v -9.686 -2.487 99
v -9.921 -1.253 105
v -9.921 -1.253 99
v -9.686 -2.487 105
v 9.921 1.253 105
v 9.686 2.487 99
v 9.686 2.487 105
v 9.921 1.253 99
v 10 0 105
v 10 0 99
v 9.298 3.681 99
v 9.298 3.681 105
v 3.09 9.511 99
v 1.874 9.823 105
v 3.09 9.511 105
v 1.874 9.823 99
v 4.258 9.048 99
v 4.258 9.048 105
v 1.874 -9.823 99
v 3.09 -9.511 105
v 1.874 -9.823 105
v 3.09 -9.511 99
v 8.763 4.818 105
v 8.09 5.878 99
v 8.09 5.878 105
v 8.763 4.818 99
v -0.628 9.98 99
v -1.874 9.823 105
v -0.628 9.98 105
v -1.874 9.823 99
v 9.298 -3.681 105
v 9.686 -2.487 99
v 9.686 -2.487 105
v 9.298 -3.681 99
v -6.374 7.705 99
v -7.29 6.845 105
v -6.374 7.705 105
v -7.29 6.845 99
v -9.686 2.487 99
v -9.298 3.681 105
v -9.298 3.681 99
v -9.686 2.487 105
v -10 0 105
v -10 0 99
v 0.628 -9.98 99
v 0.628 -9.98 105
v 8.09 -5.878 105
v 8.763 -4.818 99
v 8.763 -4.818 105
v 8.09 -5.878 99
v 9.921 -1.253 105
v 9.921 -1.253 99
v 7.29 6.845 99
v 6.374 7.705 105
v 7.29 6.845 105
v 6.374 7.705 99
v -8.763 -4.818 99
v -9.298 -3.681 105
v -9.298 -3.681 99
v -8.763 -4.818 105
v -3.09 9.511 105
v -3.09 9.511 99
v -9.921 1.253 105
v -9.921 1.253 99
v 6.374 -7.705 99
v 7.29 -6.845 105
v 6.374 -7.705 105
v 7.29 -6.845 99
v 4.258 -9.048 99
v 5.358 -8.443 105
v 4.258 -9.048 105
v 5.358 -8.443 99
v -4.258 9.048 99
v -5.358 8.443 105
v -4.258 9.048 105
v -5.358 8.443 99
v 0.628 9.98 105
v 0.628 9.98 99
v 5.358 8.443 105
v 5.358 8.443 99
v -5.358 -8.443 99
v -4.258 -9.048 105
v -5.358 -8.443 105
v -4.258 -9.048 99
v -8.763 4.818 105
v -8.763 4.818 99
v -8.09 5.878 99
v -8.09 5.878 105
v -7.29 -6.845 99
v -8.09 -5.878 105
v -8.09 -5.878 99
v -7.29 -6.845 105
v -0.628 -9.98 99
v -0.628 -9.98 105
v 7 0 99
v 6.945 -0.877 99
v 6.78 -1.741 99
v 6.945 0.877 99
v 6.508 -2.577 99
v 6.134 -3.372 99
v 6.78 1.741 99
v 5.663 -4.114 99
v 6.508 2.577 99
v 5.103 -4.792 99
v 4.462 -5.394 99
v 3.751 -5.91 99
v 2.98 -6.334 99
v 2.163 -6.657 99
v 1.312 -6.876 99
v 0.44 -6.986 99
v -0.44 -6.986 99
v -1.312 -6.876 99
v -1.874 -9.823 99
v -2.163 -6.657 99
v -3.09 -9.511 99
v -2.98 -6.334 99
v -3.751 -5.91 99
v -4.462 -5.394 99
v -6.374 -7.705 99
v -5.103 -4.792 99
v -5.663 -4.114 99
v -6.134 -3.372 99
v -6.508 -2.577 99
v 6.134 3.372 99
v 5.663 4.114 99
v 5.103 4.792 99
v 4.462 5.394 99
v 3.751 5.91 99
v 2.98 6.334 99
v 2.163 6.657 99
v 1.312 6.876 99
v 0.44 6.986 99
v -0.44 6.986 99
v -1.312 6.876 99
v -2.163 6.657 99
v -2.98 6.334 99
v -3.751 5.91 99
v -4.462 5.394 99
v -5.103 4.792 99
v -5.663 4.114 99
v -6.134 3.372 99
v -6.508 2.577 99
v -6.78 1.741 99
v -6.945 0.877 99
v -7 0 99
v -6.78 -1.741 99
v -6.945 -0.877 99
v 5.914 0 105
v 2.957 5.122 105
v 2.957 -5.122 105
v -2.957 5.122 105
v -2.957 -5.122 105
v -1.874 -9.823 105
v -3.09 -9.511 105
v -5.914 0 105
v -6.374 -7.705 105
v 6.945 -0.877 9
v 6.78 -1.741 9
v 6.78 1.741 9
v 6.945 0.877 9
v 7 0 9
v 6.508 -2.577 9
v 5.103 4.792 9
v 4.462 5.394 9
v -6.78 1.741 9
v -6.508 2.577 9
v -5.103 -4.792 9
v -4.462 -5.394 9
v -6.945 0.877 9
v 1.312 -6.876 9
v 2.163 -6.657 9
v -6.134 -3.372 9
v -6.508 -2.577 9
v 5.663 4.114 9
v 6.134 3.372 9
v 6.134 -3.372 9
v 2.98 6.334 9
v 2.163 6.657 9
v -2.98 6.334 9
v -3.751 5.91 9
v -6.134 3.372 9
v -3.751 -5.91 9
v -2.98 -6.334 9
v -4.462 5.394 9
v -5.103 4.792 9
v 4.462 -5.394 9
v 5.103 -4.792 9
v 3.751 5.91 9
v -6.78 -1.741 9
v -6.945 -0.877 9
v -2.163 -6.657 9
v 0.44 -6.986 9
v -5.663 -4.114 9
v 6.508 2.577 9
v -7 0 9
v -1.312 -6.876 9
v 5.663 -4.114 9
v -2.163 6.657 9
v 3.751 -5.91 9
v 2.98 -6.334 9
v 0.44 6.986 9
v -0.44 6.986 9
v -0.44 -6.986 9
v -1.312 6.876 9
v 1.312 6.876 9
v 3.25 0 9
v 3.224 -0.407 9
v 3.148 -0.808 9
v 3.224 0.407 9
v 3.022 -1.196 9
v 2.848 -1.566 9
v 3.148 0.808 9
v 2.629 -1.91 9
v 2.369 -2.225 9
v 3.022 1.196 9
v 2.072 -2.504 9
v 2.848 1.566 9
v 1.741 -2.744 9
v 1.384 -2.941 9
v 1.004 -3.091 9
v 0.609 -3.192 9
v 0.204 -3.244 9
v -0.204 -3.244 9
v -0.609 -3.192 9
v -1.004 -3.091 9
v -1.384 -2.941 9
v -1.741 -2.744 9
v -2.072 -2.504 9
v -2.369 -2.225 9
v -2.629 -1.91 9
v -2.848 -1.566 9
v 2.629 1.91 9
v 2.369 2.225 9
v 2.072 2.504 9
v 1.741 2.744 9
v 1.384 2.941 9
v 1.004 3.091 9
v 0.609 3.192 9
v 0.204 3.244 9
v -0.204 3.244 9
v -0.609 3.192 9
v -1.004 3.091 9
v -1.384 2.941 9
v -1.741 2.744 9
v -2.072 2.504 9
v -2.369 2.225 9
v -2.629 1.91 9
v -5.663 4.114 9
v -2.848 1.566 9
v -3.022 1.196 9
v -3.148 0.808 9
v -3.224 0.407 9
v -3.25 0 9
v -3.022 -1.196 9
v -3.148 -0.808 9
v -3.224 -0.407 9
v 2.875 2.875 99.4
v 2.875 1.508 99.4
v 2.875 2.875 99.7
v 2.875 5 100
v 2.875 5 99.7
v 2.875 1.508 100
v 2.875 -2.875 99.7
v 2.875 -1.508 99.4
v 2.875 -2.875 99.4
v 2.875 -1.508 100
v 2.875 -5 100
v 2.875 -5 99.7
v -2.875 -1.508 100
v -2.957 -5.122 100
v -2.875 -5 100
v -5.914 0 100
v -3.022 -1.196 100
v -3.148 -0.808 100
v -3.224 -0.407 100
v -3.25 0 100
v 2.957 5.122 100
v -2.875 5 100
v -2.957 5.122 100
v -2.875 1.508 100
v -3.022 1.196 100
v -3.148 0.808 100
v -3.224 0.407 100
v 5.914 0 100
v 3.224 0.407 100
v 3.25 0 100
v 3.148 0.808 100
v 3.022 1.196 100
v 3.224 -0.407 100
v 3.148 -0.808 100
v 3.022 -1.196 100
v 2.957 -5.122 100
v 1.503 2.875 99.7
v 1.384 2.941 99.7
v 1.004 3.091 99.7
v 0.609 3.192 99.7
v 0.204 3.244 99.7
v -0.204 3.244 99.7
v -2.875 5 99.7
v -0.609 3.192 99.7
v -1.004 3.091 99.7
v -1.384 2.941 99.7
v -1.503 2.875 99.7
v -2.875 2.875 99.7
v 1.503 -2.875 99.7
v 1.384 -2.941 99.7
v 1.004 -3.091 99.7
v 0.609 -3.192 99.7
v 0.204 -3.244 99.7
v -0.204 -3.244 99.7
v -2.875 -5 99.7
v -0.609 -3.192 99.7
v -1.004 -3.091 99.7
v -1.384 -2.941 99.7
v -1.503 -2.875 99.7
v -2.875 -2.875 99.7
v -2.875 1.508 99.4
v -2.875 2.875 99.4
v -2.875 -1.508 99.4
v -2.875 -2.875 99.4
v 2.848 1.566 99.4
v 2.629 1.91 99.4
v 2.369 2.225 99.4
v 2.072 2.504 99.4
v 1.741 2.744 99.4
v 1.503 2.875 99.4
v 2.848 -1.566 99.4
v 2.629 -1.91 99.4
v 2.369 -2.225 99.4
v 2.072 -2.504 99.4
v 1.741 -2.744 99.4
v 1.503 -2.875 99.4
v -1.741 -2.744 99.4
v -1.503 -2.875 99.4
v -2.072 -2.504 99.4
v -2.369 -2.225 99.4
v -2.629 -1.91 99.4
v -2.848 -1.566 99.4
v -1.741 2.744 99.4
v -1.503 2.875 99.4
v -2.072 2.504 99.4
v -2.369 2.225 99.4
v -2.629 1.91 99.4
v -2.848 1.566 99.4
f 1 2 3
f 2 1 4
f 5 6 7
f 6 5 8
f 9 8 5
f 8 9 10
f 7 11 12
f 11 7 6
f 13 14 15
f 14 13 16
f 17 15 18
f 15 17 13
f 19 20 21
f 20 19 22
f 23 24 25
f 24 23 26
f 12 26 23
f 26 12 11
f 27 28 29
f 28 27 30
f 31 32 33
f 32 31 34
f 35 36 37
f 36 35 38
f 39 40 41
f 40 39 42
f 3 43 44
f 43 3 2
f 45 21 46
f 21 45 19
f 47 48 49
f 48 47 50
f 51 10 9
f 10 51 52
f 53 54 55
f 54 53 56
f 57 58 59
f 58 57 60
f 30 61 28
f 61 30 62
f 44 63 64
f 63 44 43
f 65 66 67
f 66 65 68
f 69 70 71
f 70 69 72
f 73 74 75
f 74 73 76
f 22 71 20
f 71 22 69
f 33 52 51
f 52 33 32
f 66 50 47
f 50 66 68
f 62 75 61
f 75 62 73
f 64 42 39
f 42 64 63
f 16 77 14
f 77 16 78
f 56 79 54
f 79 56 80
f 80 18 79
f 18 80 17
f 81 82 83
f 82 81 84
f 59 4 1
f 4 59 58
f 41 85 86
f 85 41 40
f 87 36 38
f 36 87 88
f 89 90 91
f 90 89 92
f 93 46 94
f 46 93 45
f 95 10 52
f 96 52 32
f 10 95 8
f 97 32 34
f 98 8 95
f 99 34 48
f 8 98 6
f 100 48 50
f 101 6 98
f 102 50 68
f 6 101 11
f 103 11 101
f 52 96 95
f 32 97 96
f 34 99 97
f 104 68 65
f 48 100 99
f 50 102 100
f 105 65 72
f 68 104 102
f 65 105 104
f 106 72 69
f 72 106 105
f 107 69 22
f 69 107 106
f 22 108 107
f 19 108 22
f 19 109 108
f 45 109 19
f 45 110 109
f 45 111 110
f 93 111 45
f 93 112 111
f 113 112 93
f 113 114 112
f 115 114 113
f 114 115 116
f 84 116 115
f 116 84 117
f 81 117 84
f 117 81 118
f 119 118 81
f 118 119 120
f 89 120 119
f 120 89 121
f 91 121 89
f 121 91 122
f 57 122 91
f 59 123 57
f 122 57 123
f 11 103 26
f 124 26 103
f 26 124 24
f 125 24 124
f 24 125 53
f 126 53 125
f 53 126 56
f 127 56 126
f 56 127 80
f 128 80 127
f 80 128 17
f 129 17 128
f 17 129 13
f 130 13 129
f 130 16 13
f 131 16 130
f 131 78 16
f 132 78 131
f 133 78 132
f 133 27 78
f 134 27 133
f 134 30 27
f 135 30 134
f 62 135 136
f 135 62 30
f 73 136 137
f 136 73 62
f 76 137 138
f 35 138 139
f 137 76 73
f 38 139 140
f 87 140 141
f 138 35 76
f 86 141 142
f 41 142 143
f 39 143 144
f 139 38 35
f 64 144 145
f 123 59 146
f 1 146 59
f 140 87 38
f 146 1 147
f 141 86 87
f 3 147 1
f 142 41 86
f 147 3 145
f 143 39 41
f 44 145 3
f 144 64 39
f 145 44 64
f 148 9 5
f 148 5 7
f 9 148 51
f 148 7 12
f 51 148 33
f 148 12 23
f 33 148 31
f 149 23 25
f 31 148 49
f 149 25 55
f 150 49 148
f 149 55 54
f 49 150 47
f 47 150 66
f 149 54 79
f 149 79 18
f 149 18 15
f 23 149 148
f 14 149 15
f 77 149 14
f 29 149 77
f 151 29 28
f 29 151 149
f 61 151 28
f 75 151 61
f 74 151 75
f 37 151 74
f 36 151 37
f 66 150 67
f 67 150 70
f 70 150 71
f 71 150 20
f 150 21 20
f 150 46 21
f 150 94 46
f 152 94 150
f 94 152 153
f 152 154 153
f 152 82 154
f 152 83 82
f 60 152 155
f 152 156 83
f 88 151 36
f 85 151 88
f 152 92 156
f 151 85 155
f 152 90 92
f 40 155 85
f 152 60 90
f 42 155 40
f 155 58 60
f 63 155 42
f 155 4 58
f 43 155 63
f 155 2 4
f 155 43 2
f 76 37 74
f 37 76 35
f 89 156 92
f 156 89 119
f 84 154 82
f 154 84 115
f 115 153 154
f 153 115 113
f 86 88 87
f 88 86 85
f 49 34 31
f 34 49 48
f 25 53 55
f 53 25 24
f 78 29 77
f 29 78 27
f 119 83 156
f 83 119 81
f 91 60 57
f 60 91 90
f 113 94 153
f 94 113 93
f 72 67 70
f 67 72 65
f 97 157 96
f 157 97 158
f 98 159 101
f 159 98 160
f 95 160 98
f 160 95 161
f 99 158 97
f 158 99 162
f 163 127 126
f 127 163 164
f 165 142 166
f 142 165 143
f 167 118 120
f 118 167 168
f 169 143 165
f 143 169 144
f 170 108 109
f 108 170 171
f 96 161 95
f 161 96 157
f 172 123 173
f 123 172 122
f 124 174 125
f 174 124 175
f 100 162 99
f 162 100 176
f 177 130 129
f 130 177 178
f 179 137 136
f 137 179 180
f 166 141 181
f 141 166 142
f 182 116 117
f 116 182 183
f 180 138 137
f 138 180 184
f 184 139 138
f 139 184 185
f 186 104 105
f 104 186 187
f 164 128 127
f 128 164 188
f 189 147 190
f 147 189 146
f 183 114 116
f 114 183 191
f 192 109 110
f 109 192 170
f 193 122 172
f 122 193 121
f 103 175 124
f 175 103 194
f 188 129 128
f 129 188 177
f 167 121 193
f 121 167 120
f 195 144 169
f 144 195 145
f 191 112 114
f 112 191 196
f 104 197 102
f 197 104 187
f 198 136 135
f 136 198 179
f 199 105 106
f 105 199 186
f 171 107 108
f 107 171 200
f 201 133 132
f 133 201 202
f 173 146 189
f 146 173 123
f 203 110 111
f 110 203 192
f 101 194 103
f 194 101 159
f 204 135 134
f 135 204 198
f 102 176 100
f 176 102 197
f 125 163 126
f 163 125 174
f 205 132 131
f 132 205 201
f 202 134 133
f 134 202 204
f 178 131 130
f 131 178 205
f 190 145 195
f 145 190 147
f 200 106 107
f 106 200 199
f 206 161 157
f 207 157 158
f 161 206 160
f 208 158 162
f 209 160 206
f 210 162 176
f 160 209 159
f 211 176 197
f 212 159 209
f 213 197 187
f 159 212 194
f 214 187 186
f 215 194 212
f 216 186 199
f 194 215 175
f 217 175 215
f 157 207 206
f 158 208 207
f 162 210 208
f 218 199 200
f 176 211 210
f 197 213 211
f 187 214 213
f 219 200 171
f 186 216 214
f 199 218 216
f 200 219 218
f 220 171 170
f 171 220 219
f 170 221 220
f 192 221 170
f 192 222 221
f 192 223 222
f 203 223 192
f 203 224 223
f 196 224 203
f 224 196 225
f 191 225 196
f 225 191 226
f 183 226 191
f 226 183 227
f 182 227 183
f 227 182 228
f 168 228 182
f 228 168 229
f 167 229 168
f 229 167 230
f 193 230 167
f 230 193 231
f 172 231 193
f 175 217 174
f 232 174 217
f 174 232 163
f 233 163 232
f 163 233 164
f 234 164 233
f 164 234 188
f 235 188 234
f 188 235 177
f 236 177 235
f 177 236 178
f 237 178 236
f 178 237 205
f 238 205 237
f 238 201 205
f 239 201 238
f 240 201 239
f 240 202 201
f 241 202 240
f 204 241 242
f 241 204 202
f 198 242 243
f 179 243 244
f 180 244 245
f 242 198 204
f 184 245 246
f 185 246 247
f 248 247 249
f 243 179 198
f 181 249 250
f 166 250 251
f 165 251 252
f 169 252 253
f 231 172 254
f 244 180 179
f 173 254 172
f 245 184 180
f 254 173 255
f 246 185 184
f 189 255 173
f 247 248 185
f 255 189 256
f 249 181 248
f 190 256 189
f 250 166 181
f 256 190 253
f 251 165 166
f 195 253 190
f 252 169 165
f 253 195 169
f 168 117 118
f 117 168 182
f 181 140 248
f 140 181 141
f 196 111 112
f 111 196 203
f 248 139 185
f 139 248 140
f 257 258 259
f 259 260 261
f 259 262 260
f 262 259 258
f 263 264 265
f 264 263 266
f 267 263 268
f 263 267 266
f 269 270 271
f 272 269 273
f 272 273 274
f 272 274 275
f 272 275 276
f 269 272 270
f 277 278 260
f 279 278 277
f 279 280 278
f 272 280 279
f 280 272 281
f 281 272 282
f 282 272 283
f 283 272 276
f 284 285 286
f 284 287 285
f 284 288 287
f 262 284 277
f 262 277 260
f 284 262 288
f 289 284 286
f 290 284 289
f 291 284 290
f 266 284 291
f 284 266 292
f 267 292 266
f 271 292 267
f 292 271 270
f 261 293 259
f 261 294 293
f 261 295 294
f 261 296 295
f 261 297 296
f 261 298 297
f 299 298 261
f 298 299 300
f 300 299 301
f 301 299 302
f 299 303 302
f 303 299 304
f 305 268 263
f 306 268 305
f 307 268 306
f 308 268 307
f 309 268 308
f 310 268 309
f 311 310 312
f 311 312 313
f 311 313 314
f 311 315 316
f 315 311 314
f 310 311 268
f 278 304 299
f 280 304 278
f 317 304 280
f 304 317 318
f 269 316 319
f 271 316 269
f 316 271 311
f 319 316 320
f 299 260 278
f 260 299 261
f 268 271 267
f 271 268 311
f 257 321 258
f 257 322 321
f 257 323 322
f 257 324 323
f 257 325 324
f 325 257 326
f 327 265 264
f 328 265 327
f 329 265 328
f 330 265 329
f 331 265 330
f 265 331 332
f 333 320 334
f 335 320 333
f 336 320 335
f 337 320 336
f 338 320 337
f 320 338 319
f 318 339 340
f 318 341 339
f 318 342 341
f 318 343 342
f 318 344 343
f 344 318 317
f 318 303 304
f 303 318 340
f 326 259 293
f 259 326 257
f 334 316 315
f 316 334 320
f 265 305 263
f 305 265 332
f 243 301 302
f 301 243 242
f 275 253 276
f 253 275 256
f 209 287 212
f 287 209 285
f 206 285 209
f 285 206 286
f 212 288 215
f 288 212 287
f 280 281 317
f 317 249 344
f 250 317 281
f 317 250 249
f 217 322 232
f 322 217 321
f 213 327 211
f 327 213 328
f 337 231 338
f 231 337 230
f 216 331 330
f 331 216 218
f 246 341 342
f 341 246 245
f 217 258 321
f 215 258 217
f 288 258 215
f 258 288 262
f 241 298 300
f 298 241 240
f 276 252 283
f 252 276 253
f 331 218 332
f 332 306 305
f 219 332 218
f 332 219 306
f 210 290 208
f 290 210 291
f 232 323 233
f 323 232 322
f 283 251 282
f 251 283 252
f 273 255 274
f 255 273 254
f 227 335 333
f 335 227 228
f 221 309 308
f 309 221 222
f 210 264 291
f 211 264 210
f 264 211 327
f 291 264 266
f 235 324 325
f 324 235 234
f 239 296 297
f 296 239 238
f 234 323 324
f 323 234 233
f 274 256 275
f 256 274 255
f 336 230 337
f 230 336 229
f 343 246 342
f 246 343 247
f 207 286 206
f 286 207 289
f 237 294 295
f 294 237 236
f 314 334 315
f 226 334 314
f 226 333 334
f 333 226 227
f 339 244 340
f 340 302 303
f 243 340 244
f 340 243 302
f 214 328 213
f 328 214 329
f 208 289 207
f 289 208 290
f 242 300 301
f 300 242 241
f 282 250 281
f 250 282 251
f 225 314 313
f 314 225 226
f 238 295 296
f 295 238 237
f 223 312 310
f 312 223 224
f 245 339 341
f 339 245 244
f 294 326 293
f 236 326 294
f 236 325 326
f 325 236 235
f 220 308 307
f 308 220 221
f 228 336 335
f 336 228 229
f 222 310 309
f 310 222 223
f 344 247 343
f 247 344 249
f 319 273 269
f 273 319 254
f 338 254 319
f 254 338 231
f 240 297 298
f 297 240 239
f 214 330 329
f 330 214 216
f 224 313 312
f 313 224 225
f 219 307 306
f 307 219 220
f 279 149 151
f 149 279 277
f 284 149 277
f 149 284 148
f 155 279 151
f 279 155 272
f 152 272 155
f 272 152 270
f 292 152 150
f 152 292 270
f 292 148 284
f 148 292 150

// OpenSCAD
$fn = 50;


difference() {
	union() {
		translate(v = [0, 0, 99.0000000000]) {
			cylinder(h = 6, r = 10.0000000000);
		}
		translate(v = [0, 0, 9.0000000000]) {
			cylinder(h = 96, r = 7.0000000000);
		}
	}
	union() {
		translate(v = [0, 0, 105]) {
			rotate(a = [0, 0, 0]) {
				difference() {
					union() {
						#translate(v = [-2.8750000000, -5.0000000000, -5.3000000000]) {
							cube(size = [5.7500000000, 10, 0.3000000000]);
						}
						#translate(v = [-2.8750000000, -2.8750000000, -5.6000000000]) {
							cube(size = [5.7500000000, 5.7500000000, 0.3000000000]);
						}
						#translate(v = [-2.8750000000, -5.0000000000, 0]) {
							cube(size = [5.7500000000, 10, 0.3000000000]);
						}
						#translate(v = [-2.8750000000, -2.8750000000, 0.3000000000]) {
							cube(size = [5.7500000000, 5.7500000000, 0.3000000000]);
						}
						#translate(v = [0, 0, -100.0000000000]) {
							cylinder(h = 200, r = 3.2500000000);
						}
						translate(v = [0, 0, -5]) {
							#linear_extrude(height = 5) {
								polygon(points = [[5.9142500000, 0.0000000000], [2.9571250000, 5.1218907443], [-2.9571250000, 5.1218907443], [-5.9142500000, 0.0000000000], [-2.9571250000, -5.1218907443], [2.9571250000, -5.1218907443]]);
							}
						}
						#translate(v = [-2.8750000000, -5.0000000000, -5.3000000000]) {
							cube(size = [5.7500000000, 10, 0.3000000000]);
						}
						#translate(v = [-2.8750000000, -2.8750000000, -5.6000000000]) {
							cube(size = [5.7500000000, 5.7500000000, 0.3000000000]);
						}
						#translate(v = [-2.8750000000, -5.0000000000, 0]) {
							cube(size = [5.7500000000, 10, 0.3000000000]);
						}
						#translate(v = [-2.8750000000, -2.8750000000, 0.3000000000]) {
							cube(size = [5.7500000000, 5.7500000000, 0.3000000000]);
						}
						#translate(v = [0, 0, -100.0000000000]) {
							cylinder(h = 200, r = 3.2500000000);
						}
						#translate(v = [-2.8750000000, -5.0000000000, -5.3000000000]) {
							cube(size = [5.7500000000, 10, 0.3000000000]);
						}
						#translate(v = [-2.8750000000, -2.8750000000, -5.6000000000]) {
							cube(size = [5.7500000000, 5.7500000000, 0.3000000000]);
						}
						#translate(v = [-2.8750000000, -5.0000000000, 0]) {
							cube(size = [5.7500000000, 10, 0.3000000000]);
						}
						#translate(v = [-2.8750000000, -2.8750000000, 0.3000000000]) {
							cube(size = [5.7500000000, 5.7500000000, 0.3000000000]);
						}
						#translate(v = [0, 0, -100.0000000000]) {
							cylinder(h = 200, r = 3.2500000000);
						}
					}
					union();
				}
			}
		}
		#translate(v = [0, 0, -100.0000000000]) {
			cylinder(h = 200, r = 3.2500000000);
		}
	}
}
